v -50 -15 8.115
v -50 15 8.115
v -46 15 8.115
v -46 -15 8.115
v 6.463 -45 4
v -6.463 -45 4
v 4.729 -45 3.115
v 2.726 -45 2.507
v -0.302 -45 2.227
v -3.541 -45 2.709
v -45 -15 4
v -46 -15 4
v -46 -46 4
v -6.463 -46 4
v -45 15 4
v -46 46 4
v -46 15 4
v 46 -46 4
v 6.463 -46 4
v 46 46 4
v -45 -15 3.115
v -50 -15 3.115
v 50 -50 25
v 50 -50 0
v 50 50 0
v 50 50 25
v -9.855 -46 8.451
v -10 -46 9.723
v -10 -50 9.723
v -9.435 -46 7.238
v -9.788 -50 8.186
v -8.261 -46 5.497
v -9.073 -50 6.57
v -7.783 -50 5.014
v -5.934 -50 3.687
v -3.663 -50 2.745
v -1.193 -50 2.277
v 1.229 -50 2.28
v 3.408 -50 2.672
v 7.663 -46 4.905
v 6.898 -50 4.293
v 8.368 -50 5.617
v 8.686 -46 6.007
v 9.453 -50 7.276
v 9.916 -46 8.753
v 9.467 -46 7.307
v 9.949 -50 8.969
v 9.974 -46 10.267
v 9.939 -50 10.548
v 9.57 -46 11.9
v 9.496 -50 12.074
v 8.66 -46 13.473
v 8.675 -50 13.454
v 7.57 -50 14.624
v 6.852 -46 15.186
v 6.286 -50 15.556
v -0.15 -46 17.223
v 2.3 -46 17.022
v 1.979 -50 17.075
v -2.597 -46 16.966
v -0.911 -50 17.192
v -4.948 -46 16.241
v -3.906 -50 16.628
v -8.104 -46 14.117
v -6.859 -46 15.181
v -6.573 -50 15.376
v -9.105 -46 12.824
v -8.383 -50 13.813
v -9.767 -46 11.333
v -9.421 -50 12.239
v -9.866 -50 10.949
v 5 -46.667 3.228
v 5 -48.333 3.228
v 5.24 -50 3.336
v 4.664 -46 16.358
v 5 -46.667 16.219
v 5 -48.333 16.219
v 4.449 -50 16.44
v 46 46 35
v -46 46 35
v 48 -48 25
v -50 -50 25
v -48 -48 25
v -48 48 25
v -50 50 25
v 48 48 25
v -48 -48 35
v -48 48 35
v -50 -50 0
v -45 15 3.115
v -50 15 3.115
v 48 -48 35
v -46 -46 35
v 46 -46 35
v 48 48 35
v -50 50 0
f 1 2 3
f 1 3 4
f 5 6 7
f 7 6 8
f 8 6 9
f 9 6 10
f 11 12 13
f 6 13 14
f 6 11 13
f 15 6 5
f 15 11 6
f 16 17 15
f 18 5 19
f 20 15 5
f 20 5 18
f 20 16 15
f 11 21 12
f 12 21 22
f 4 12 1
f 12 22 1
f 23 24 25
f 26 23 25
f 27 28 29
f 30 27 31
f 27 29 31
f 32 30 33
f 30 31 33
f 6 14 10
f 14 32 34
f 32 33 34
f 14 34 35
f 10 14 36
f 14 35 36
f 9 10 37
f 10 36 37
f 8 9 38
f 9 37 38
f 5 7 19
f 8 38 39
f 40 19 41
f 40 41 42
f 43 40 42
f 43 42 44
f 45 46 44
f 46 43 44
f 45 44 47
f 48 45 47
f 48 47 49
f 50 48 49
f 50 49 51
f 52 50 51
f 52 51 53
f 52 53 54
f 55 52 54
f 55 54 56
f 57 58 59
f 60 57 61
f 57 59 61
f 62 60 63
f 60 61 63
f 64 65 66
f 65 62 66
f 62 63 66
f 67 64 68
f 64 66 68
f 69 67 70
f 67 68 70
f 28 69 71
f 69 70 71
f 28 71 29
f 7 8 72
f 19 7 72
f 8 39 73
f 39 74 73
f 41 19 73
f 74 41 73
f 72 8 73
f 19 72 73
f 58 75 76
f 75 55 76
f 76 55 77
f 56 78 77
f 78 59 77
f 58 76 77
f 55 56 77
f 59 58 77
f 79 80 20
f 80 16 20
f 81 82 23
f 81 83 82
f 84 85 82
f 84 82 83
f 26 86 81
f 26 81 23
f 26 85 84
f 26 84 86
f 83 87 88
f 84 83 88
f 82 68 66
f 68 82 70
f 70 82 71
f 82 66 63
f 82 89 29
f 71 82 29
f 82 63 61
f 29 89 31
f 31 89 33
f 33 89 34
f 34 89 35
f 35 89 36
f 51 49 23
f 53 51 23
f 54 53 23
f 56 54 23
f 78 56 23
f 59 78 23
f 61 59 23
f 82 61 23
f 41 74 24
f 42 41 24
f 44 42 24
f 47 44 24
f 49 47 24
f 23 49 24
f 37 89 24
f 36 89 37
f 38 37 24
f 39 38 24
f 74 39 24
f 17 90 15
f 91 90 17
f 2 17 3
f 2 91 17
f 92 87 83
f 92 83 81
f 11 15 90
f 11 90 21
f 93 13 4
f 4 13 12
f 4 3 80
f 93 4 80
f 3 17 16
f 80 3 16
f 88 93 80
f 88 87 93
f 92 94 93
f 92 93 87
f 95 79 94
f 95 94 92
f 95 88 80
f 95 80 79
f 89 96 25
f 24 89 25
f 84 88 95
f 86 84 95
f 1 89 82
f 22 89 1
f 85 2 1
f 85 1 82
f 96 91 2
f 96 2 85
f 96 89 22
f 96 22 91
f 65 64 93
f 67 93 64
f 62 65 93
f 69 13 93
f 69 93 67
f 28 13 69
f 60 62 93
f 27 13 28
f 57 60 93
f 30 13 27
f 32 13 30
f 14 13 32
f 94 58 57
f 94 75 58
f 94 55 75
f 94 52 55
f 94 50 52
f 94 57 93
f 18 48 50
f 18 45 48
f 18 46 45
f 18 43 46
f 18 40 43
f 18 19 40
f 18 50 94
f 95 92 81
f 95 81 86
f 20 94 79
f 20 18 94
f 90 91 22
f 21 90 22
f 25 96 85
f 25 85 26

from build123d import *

# Parameters (mm, degrees)
F0_W     = 100
F0_H     = 100
F1_DEPTH = 35
F2_T     = -4
F3_W     = 96
F3_H     = 96
F4_DEPTH = 10
F5_W     = 30
F5_H     = 5
F6_DEPTH = 5
F8_DEPTH = 5


with BuildPart() as f1:
    # F0 (on Top) → F1 (new body)
    with BuildSketch(Plane.XY):
        Rectangle(F0_W, F0_H)
    extrude(amount=F1_DEPTH)

    # F2
    f2_openings = [f1.faces().sort_by_distance(p)[0] for p in [
        (0, 0, 35),
    ]]
    offset(amount=F2_T, openings=f2_openings)

    # F3 (on face) → F4 (cut)
    with BuildSketch(Plane.XY.offset(35)):
        Polygon((-48, 50), (-50, 50), (-50, 48), (-50, -48), (-50, -50), (-48, -50), (48, -50), (50, -50), (50, -48), (50, 48), (50, 50), (48, 50), align=None)
        Rectangle(F3_W, F3_H, mode=Mode.SUBTRACT)
    extrude(amount=-F4_DEPTH, mode=Mode.SUBTRACT)

    # F5 (on face) → F6 (cut)
    with BuildSketch(Plane(origin=(-50, 0, 0), x_dir=(0, -1, 0), z_dir=(-1, 0, 0))):
        with Locations((0, 5.614583)):
            Rectangle(F5_W, F5_H)
    extrude(amount=-F6_DEPTH, mode=Mode.SUBTRACT)

    # F7 (on face) → F8 (cut)
    with BuildSketch(Plane.XZ.offset(50)):
        with BuildLine():
            add(Edge.make_bspline(
                [(-10, 9.723425), (-10, -3.266956), (5, 3.228234), (20, 9.723425), (5, 16.218615), (-10, 22.713806), (-10, 9.723425)],
                knots=[0, 0, 0, 2.094395, 2.094395, 4.18879, 4.18879, 6.283185, 6.283185, 6.283185], degree=2, weights=[1, 0.5, 1, 0.5, 1, 0.5, 1]))
        make_face()
    extrude(amount=-F8_DEPTH, mode=Mode.SUBTRACT)


solid = f1.part
